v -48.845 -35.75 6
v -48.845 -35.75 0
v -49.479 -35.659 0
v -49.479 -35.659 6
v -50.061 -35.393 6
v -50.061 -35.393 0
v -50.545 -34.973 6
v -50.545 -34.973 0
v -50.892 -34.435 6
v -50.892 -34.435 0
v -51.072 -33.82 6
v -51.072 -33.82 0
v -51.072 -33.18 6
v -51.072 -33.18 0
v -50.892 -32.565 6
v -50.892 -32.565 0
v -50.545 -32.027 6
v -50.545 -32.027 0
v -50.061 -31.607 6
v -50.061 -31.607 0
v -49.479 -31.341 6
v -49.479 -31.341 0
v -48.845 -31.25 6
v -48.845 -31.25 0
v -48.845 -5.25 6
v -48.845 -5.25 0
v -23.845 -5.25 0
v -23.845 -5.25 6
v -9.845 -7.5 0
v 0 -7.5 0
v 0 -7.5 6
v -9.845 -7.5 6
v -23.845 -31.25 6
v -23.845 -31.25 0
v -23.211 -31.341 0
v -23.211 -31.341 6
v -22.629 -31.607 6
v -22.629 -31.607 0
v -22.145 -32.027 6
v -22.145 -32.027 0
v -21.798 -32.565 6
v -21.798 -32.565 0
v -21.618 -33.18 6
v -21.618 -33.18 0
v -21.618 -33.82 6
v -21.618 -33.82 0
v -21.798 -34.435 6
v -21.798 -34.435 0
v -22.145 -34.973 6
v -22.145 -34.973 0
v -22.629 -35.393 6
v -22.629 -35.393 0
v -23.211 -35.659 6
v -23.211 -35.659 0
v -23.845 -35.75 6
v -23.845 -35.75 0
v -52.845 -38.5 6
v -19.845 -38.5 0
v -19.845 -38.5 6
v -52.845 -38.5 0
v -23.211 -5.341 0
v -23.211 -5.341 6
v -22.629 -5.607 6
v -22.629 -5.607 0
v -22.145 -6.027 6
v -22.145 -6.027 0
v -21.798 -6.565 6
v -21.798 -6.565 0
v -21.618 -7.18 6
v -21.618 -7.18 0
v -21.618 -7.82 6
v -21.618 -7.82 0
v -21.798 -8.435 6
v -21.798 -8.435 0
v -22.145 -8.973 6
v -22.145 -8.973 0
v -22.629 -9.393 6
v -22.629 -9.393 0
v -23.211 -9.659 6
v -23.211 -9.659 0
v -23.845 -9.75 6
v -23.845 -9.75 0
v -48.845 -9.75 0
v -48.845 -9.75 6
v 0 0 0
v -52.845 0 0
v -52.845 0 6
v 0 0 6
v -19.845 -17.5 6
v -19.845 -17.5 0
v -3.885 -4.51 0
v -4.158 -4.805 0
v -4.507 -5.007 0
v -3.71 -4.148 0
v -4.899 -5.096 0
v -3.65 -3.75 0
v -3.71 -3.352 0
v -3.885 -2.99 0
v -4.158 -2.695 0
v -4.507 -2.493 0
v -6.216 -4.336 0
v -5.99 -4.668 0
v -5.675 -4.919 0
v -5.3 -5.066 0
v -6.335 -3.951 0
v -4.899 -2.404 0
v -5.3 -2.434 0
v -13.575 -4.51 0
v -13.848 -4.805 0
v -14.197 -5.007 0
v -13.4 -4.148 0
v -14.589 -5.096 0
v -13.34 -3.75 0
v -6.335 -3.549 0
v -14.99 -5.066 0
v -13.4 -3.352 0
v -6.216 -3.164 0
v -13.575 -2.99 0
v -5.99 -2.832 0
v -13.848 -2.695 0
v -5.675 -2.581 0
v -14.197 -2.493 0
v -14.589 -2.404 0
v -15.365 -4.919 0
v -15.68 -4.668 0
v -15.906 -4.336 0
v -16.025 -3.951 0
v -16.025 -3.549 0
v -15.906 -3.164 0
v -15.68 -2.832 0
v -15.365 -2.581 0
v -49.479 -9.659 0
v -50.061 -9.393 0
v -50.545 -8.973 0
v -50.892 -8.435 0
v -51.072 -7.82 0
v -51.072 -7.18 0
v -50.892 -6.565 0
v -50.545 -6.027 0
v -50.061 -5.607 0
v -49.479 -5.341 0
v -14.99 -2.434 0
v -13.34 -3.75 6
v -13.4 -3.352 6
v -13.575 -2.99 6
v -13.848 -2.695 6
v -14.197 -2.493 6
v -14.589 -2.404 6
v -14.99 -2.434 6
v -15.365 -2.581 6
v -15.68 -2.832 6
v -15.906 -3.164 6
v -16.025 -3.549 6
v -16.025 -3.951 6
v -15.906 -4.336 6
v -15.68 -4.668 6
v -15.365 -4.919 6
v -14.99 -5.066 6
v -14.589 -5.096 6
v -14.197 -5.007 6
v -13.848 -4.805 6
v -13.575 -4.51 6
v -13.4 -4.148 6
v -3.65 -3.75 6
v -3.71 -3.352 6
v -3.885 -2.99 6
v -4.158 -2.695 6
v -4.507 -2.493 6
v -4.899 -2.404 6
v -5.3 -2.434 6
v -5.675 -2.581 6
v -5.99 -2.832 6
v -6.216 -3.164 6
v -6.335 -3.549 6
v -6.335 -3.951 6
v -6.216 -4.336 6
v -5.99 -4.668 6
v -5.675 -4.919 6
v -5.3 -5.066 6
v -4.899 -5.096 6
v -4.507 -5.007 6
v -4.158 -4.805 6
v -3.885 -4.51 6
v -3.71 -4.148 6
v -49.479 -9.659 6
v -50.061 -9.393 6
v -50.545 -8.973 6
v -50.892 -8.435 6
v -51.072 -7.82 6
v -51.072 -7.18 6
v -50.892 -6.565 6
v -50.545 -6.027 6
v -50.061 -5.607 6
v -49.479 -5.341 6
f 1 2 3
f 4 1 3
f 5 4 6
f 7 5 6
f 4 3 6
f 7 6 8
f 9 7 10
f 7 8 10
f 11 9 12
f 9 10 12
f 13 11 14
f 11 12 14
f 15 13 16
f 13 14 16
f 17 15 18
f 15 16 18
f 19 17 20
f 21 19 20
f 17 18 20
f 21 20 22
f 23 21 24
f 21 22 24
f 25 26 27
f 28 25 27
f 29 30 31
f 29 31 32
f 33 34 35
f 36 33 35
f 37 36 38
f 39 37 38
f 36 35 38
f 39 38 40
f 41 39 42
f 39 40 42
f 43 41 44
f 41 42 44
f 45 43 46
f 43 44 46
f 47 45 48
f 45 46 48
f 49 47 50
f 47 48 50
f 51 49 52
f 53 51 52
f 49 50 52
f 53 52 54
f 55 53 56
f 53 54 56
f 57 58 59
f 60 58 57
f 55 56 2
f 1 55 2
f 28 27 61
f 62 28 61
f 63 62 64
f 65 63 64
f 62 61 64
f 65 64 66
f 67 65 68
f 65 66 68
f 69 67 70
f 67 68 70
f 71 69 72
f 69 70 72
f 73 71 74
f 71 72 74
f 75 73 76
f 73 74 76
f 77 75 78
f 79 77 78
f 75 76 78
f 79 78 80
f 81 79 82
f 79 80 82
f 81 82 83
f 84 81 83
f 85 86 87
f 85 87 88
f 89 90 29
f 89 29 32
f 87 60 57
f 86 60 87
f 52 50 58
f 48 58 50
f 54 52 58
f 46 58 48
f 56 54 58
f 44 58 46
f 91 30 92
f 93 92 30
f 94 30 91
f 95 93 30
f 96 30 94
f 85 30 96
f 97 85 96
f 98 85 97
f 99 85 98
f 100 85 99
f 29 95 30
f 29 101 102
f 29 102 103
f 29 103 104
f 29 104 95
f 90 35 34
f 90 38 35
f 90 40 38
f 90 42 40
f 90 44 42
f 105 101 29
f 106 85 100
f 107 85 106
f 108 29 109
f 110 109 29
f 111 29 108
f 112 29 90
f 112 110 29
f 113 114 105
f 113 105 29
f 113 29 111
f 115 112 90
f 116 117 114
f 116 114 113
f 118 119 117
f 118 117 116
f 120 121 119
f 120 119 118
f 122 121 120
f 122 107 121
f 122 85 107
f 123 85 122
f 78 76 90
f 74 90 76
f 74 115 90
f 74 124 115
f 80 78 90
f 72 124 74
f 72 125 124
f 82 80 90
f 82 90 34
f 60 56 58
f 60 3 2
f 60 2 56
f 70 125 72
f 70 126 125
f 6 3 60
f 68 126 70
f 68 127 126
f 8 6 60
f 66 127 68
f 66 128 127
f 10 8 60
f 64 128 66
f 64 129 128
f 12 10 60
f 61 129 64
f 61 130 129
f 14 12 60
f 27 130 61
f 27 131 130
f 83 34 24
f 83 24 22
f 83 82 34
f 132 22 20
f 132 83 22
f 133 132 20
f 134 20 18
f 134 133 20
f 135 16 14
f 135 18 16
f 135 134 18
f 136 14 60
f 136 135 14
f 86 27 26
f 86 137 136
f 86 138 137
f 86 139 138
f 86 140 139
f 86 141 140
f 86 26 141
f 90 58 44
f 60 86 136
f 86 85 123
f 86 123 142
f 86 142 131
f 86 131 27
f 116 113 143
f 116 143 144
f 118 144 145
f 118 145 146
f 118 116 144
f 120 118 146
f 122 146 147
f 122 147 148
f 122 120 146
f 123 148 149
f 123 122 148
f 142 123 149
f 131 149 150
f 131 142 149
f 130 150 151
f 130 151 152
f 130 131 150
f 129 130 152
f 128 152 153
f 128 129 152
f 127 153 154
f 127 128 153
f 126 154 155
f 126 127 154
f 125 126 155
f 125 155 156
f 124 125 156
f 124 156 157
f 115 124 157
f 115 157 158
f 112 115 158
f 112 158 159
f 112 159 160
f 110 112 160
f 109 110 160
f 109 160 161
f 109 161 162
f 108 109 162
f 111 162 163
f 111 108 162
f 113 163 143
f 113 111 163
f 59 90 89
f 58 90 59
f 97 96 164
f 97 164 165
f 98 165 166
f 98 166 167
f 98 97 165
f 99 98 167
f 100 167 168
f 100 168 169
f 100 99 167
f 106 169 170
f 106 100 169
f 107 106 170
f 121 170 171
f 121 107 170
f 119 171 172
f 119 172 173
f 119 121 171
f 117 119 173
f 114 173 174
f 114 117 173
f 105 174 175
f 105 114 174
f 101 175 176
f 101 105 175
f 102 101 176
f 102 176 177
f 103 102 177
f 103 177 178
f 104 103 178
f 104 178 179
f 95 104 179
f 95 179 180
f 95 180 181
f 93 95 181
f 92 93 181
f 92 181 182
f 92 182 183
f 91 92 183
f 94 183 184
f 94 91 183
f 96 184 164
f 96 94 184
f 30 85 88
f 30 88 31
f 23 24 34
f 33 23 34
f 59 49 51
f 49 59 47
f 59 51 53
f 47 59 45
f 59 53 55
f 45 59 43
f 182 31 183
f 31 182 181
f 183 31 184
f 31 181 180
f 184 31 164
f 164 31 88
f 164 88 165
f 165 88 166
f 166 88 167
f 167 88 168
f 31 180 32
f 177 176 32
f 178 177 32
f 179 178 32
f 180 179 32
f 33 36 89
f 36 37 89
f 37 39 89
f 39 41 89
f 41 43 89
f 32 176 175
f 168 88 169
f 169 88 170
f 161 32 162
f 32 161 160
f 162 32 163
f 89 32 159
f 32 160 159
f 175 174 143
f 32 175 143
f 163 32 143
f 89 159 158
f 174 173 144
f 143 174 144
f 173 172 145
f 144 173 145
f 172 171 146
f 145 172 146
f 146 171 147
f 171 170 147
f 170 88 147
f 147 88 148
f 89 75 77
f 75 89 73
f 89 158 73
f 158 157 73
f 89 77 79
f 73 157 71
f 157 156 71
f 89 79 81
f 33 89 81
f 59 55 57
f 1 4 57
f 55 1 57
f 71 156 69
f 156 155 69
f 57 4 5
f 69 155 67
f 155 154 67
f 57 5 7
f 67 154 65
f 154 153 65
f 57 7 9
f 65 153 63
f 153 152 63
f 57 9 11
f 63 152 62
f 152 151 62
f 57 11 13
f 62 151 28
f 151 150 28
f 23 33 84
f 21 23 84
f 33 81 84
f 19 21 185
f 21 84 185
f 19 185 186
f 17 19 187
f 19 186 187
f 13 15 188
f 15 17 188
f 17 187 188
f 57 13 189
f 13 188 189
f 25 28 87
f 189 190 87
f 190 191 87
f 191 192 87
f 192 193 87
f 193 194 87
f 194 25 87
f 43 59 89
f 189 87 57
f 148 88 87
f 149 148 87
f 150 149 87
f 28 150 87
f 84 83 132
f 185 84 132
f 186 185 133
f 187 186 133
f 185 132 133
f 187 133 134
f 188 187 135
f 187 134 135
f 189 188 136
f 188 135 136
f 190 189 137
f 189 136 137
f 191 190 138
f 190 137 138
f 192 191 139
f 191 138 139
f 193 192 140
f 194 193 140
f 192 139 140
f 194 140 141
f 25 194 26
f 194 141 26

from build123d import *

# Parameters (mm, degrees)
SKETCH7_R           = 1.35
BOSS_EXTRUDE4_DEPTH = 6
CHAMFER1_SIZE       = 10


with BuildPart() as part:
    # Sketch7 → Boss-Extrude4 (new body)
    with BuildSketch(Plane.XY):
        Polygon((-52.845, 0), (0, 0), (0, -7.5), (-19.845, -7.5), (-19.845, -38.5), (-52.845, -38.5), align=None)
        with Locations((-14.69, -3.75)):
            Circle(SKETCH7_R, mode=Mode.SUBTRACT)
        with Locations((-5, -3.75)):
            Circle(SKETCH7_R, mode=Mode.SUBTRACT)
        with BuildLine():
            Line((-48.845, -5.25), (-23.845, -5.25))
            ThreePointArc((-23.845, -5.25), (-21.595, -7.5), (-23.845, -9.75))
            Line((-23.845, -9.75), (-48.845, -9.75))
            ThreePointArc((-48.845, -9.75), (-51.095, -7.5), (-48.845, -5.25))
        make_face(mode=Mode.SUBTRACT)
        with BuildLine():
            Line((-48.845, -31.25), (-23.845, -31.25))
            ThreePointArc((-23.845, -31.25), (-21.595, -33.5), (-23.845, -35.75))
            Line((-23.845, -35.75), (-48.845, -35.75))
            ThreePointArc((-48.845, -35.75), (-51.095, -33.5), (-48.845, -31.25))
        make_face(mode=Mode.SUBTRACT)
    extrude(amount=BOSS_EXTRUDE4_DEPTH)

    # Chamfer1
    chamfer1_edges = [part.edges().sort_by_distance(p)[0] for p in [
        (-19.845, -7.5, 3),
    ]]
    chamfer(chamfer1_edges, length=CHAMFER1_SIZE)


solid = part.part
